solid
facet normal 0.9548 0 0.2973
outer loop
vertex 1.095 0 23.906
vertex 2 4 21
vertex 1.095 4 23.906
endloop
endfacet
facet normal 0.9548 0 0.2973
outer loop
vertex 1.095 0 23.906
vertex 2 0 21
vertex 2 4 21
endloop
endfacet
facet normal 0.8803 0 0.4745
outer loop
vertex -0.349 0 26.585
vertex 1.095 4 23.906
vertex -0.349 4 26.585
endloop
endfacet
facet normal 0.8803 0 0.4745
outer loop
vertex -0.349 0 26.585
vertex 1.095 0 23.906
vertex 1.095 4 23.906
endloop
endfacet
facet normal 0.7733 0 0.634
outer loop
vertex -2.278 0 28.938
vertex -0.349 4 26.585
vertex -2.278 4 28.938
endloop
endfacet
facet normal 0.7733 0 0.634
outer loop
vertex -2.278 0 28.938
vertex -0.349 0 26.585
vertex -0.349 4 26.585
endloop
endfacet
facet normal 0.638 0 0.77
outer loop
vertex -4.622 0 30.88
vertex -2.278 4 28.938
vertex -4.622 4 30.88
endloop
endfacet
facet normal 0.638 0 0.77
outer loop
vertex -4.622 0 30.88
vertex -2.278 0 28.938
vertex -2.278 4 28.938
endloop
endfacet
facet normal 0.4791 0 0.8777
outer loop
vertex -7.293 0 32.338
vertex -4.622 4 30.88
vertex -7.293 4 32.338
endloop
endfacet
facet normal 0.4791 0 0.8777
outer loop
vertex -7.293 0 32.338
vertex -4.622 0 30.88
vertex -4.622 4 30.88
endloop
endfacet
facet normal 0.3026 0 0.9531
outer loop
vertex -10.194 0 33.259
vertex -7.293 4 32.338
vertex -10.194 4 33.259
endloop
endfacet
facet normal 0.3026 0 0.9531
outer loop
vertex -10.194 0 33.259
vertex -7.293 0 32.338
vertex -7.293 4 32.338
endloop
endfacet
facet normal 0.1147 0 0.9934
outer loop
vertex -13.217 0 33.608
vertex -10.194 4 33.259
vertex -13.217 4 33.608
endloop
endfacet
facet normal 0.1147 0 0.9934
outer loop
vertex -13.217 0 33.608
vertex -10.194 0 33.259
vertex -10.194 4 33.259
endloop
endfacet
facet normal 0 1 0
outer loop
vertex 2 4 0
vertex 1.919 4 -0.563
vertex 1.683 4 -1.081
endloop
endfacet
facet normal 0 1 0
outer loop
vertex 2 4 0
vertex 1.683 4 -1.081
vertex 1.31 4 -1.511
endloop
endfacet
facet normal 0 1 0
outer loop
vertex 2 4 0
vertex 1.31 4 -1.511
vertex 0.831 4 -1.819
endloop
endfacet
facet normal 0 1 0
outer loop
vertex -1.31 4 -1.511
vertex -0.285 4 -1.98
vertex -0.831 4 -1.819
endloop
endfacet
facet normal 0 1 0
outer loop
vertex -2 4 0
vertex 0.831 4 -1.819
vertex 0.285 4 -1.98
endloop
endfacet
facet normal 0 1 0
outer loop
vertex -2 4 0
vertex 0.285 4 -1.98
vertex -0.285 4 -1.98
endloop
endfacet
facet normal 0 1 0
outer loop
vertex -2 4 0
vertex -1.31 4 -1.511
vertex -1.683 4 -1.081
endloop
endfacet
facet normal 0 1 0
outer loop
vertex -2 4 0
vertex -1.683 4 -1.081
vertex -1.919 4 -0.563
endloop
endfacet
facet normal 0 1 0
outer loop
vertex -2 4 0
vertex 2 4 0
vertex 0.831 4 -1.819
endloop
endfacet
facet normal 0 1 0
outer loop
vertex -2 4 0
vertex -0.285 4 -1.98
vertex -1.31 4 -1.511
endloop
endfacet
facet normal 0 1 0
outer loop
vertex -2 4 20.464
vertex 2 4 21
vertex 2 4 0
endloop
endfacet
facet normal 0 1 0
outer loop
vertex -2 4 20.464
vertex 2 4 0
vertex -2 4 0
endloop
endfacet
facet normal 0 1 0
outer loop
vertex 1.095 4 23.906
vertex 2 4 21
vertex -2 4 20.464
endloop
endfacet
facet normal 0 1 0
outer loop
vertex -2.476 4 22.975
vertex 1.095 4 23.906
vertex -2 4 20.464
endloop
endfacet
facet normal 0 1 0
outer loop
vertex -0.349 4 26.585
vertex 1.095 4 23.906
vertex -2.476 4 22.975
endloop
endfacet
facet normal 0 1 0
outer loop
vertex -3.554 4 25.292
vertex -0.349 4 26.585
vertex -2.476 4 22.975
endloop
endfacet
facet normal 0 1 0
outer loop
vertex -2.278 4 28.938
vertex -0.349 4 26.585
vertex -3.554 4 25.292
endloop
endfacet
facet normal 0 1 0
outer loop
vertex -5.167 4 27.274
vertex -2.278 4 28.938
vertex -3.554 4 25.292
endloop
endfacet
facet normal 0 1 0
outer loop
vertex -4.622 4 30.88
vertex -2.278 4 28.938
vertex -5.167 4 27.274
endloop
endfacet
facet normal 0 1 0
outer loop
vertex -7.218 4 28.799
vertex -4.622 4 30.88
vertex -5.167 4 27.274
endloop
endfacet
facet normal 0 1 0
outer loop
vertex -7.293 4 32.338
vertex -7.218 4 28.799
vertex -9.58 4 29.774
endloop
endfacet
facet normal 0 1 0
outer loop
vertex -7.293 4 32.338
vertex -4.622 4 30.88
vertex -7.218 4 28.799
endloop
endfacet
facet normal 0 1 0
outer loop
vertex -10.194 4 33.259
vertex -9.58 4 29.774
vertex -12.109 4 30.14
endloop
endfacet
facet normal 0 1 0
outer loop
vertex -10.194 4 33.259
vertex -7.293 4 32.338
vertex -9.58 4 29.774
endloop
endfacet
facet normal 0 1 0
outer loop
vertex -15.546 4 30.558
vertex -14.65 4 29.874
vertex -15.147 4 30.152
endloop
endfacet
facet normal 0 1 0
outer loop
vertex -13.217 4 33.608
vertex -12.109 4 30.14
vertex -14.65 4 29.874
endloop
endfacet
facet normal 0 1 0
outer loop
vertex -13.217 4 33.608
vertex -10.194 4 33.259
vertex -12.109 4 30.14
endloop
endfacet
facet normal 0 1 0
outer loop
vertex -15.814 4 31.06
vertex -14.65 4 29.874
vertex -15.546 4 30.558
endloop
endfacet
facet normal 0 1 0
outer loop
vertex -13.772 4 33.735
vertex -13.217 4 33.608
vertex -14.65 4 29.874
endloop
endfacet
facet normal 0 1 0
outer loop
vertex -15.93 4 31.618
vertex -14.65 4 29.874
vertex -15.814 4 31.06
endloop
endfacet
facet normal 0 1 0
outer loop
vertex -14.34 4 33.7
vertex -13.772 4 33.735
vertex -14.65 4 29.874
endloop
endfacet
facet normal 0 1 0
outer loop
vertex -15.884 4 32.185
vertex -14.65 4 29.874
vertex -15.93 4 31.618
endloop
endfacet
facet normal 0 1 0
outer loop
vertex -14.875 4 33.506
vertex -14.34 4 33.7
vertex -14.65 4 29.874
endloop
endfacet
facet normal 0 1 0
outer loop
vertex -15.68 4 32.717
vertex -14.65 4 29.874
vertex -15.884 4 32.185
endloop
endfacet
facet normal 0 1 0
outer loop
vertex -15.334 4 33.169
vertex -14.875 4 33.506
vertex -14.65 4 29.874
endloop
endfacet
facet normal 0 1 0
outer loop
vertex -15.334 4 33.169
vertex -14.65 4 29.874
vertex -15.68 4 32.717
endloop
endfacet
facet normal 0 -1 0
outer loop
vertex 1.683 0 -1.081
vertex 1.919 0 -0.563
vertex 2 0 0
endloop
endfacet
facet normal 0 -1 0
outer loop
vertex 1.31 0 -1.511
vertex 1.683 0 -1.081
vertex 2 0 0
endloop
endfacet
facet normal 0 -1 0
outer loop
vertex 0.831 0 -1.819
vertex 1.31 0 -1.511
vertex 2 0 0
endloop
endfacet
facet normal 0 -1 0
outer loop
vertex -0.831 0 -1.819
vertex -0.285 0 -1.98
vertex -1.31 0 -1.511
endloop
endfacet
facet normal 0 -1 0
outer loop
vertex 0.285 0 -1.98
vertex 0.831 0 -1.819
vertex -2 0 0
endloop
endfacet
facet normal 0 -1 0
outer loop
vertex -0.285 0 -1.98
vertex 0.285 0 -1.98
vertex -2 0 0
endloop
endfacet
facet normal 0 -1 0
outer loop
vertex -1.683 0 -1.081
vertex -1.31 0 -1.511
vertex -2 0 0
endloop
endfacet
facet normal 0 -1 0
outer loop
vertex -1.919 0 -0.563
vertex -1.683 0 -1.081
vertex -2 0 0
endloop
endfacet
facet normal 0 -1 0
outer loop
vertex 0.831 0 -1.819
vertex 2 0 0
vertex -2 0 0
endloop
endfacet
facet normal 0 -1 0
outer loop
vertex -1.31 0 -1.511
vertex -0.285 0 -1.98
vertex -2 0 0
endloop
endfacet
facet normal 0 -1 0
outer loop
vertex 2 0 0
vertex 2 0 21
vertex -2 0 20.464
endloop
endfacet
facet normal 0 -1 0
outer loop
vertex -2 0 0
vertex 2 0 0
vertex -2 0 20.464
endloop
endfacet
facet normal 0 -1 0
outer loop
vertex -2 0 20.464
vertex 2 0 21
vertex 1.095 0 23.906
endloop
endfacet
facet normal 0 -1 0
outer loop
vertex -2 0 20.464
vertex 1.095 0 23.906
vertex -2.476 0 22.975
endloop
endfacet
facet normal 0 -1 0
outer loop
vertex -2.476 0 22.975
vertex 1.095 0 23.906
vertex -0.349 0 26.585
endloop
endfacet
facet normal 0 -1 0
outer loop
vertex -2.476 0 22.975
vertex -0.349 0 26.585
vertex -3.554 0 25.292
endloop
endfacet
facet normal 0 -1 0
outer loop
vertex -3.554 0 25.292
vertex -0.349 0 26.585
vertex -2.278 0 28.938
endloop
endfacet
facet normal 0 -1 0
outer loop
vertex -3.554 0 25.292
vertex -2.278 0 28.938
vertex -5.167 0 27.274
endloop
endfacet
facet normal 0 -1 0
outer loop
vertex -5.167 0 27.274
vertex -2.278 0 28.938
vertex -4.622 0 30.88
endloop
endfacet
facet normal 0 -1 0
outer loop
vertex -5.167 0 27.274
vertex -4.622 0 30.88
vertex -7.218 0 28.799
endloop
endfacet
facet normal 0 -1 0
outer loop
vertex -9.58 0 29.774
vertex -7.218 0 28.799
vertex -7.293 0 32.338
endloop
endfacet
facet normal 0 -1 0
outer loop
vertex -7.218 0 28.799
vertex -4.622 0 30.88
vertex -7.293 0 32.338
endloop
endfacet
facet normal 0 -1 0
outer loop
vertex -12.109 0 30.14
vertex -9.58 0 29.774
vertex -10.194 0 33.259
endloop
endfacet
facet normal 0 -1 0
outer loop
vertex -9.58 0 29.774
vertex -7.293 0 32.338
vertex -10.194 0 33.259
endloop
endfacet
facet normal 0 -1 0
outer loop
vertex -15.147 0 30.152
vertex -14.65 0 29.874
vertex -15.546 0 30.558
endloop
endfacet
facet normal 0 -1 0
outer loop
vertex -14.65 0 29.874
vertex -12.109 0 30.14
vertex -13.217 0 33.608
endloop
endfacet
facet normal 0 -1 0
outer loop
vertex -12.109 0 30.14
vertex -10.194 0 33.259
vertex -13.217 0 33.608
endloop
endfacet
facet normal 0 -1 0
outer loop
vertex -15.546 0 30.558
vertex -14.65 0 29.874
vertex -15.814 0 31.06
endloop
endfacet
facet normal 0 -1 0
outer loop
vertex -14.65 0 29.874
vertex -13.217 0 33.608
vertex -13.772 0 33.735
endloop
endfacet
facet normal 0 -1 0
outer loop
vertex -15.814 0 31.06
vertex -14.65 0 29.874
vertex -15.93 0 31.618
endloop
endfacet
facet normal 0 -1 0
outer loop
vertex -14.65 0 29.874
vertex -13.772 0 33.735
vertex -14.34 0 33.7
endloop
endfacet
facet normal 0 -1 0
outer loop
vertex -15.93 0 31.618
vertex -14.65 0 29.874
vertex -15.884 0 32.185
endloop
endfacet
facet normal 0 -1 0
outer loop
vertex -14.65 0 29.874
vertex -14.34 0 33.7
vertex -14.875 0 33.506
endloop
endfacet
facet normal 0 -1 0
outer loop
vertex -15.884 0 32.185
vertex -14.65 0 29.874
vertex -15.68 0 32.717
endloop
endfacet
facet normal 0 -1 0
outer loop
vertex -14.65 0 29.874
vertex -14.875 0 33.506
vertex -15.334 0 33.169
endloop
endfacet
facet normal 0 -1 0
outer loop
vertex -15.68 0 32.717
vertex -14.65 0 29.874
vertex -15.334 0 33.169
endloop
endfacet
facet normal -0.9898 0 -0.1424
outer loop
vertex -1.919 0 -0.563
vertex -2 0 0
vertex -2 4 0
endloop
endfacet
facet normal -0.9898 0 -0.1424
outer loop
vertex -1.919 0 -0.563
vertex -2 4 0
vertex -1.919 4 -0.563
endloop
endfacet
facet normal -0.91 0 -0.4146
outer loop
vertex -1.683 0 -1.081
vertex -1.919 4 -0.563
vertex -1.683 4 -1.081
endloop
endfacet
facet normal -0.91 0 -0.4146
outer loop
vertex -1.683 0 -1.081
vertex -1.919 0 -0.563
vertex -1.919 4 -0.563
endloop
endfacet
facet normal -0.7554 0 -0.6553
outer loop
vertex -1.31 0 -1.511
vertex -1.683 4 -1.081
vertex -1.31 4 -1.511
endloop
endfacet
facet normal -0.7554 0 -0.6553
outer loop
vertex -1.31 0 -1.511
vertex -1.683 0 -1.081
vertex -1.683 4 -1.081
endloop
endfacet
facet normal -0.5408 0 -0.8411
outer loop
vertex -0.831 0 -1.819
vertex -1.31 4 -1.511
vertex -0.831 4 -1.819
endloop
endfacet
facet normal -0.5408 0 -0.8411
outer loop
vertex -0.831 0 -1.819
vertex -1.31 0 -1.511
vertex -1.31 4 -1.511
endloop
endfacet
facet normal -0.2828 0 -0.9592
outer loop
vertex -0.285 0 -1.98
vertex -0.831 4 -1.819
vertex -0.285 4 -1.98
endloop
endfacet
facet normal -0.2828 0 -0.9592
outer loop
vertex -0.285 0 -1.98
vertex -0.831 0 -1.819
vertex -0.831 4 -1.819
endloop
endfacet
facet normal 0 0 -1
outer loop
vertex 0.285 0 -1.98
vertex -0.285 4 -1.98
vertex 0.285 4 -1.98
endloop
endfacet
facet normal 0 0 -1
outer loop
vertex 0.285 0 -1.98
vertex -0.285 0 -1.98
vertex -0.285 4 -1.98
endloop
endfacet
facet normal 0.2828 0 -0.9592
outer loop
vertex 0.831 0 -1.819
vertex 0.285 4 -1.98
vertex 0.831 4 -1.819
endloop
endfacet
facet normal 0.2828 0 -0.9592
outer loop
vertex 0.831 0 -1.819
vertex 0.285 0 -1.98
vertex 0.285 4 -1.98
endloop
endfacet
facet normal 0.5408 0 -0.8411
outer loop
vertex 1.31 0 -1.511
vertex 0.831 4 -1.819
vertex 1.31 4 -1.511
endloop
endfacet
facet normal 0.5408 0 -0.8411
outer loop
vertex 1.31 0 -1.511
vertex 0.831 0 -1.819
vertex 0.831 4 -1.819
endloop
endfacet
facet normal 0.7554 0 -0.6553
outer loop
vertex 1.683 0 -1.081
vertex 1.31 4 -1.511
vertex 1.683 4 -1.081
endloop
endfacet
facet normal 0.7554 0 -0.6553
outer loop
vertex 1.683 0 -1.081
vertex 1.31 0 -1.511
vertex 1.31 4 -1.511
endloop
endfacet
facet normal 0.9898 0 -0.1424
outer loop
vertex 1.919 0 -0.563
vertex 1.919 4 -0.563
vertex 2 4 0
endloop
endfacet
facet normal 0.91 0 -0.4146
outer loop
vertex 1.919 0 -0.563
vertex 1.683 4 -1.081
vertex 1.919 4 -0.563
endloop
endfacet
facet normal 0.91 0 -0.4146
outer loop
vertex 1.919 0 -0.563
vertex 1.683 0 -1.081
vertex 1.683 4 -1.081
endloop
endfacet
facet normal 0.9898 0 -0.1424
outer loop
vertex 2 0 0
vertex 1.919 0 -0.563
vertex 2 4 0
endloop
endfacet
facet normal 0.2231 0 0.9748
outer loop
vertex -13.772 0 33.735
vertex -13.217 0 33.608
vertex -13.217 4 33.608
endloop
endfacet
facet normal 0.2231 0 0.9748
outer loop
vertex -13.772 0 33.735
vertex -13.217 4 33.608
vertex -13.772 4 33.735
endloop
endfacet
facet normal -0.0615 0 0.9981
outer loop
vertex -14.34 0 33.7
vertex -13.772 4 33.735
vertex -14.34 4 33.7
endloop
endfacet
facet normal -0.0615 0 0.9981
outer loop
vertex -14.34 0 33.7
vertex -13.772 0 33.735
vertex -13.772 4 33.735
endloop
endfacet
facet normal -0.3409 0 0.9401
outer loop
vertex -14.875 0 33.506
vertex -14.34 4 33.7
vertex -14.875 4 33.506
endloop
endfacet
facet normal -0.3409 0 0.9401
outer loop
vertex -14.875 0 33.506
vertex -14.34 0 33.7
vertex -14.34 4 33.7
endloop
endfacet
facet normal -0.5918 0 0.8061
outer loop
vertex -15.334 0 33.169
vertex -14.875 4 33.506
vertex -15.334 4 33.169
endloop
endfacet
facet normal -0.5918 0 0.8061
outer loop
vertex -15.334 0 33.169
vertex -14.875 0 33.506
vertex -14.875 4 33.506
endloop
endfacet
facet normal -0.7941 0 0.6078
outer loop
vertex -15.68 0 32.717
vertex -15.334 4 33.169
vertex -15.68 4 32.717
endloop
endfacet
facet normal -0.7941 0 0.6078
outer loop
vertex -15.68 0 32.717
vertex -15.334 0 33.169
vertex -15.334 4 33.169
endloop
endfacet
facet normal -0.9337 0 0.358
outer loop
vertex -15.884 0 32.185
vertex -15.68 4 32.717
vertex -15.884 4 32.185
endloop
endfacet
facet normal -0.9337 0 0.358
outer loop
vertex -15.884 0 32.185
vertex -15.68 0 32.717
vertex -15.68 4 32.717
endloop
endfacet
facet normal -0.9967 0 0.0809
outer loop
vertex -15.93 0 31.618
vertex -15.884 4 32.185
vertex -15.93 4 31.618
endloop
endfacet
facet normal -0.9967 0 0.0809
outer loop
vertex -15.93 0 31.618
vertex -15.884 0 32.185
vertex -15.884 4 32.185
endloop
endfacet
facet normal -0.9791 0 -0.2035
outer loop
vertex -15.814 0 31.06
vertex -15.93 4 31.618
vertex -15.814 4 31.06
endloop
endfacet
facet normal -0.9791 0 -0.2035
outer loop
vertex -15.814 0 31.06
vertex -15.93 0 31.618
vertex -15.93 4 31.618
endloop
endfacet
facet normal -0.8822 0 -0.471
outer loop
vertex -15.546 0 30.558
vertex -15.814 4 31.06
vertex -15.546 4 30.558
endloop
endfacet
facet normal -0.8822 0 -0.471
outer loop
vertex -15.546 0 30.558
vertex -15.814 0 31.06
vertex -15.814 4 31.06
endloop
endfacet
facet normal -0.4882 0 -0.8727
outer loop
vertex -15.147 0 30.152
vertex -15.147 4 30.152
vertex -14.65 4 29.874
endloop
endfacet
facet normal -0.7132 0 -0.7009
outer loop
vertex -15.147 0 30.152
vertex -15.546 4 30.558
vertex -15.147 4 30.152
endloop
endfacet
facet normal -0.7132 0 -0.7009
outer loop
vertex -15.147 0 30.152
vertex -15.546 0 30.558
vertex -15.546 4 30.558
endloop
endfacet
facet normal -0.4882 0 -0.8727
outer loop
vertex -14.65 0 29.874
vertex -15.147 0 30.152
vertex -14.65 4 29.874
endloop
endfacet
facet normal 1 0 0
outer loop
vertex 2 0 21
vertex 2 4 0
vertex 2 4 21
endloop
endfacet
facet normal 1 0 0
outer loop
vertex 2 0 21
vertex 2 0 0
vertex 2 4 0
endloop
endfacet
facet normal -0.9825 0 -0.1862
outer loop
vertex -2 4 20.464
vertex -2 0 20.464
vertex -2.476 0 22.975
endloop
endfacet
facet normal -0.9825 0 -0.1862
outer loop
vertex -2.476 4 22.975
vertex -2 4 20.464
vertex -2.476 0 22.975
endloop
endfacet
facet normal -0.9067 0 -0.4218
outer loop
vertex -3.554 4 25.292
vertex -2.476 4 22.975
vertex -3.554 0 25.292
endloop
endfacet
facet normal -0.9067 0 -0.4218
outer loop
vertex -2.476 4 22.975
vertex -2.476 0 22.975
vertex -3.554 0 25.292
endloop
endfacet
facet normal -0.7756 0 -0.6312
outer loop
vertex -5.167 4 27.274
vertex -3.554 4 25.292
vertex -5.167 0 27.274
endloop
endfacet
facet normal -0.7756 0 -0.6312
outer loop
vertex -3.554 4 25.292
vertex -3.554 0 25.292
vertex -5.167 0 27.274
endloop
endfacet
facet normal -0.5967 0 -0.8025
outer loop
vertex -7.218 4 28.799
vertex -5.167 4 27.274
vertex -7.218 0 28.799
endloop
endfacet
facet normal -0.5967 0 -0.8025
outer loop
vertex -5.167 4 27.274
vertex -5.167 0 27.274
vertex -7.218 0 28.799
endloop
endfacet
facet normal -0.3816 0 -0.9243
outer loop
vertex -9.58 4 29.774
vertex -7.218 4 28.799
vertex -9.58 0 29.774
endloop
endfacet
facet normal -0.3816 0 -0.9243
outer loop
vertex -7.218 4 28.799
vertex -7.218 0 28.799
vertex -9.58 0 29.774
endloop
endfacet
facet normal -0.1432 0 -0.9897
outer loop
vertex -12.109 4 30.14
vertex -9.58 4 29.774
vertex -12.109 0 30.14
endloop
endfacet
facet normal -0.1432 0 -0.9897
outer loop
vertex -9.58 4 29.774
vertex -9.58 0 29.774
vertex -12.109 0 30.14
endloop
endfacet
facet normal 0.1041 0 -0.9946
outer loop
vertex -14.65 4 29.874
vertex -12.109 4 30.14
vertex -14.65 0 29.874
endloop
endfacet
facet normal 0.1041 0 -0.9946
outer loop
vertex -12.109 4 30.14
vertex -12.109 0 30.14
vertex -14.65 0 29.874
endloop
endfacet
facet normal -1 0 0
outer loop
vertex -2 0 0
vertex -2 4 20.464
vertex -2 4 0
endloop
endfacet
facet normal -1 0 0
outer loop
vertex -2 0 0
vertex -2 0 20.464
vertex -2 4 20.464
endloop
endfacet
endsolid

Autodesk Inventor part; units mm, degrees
ref_plane "YZ Plane" through (0, 0, 0) normal (1, 0, 0) x (0, 1, 0)
ref_plane "XZ Plane" through (0, 0, 0) normal (0, 1, 0) x (-1, 0, 0)
ref_plane "XY Plane" through (0, 0, 0) normal (0, 0, 1) x (1, 0, 0)
sketch "Sketch1" plane through (0, 0, 0) normal (0, 1, 0) x (-1, 0, 0)
  line L0 (0, 0) -> (0, 21) construction
  line L1 (-2, 0) -> (-2, 21)
  line L2 (2, 21) -> (2, 0)
  arc A0 (-2, 0) -> (2, 0) centre (0, 0) ccw
  arc A1 (2, 21) -> (-2, 21) centre (0, 21) ccw construction
  line L3 (0, 21) -> (4, 27.9282) construction
  line L4 (1.7321, 20) -> (5.7321, 26.9282) construction
  line L5 (2.2679, 28.9282) -> (-1.7321, 22) construction
  arc A2 (-1.7321, 22) -> (1.7321, 20) centre (0, 21) ccw construction
  arc A3 (5.7321, 26.9282) -> (2.2679, 28.9282) centre (4, 27.9282) ccw construction
  line L6 (4, 27.9282) -> (13.9336, 31.7413) construction
  line L7 (3.4527, 25.5758) -> (14.6503, 29.8742) construction
  line L8 (13.2168, 33.6085) -> (3.2833, 29.7954) construction
  arc A4 (3.2833, 29.7954) -> (3, 26.1962) centre (4, 27.9282) ccw construction
  arc A5 (14.6503, 29.8742) -> (13.2168, 33.6085) centre (13.9336, 31.7413) ccw
  line L9 (13.9336, 31.7413) -> (22.9322, 31.8984) construction
  arc A6 (13.2168, 33.6085) -> (-2, 21) centre (13.5169, 17.7597) ccw
  arc A7 (14.6503, 29.8742) -> (2, 20.4641) centre (12.3124, 19.8089) ccw
  point P0 (0, 10.5)
  point P1 (2, 24.4641)
  point P2 (-1.7321, 22)
  point P3 (8.9668, 29.8348)
  point P4 (5.3779, 26.3149)
  point P5 (18.4329, 31.8199)
  dimension "d0" = 4
  dimension "d5" = 25
  dimension "d6" = 150
  dimension "d7" = 4
  dimension "d8" = 12
  dimension "d9" = 12
  dimension "d10" = 111
  dimension "d11" = 200
  dimension "d13" = 9
extrude "Extrusion1" add sketch "Sketch1" along normal blind 4
equation "\"d7\" = d0"
properties part number "_3DPrint"
